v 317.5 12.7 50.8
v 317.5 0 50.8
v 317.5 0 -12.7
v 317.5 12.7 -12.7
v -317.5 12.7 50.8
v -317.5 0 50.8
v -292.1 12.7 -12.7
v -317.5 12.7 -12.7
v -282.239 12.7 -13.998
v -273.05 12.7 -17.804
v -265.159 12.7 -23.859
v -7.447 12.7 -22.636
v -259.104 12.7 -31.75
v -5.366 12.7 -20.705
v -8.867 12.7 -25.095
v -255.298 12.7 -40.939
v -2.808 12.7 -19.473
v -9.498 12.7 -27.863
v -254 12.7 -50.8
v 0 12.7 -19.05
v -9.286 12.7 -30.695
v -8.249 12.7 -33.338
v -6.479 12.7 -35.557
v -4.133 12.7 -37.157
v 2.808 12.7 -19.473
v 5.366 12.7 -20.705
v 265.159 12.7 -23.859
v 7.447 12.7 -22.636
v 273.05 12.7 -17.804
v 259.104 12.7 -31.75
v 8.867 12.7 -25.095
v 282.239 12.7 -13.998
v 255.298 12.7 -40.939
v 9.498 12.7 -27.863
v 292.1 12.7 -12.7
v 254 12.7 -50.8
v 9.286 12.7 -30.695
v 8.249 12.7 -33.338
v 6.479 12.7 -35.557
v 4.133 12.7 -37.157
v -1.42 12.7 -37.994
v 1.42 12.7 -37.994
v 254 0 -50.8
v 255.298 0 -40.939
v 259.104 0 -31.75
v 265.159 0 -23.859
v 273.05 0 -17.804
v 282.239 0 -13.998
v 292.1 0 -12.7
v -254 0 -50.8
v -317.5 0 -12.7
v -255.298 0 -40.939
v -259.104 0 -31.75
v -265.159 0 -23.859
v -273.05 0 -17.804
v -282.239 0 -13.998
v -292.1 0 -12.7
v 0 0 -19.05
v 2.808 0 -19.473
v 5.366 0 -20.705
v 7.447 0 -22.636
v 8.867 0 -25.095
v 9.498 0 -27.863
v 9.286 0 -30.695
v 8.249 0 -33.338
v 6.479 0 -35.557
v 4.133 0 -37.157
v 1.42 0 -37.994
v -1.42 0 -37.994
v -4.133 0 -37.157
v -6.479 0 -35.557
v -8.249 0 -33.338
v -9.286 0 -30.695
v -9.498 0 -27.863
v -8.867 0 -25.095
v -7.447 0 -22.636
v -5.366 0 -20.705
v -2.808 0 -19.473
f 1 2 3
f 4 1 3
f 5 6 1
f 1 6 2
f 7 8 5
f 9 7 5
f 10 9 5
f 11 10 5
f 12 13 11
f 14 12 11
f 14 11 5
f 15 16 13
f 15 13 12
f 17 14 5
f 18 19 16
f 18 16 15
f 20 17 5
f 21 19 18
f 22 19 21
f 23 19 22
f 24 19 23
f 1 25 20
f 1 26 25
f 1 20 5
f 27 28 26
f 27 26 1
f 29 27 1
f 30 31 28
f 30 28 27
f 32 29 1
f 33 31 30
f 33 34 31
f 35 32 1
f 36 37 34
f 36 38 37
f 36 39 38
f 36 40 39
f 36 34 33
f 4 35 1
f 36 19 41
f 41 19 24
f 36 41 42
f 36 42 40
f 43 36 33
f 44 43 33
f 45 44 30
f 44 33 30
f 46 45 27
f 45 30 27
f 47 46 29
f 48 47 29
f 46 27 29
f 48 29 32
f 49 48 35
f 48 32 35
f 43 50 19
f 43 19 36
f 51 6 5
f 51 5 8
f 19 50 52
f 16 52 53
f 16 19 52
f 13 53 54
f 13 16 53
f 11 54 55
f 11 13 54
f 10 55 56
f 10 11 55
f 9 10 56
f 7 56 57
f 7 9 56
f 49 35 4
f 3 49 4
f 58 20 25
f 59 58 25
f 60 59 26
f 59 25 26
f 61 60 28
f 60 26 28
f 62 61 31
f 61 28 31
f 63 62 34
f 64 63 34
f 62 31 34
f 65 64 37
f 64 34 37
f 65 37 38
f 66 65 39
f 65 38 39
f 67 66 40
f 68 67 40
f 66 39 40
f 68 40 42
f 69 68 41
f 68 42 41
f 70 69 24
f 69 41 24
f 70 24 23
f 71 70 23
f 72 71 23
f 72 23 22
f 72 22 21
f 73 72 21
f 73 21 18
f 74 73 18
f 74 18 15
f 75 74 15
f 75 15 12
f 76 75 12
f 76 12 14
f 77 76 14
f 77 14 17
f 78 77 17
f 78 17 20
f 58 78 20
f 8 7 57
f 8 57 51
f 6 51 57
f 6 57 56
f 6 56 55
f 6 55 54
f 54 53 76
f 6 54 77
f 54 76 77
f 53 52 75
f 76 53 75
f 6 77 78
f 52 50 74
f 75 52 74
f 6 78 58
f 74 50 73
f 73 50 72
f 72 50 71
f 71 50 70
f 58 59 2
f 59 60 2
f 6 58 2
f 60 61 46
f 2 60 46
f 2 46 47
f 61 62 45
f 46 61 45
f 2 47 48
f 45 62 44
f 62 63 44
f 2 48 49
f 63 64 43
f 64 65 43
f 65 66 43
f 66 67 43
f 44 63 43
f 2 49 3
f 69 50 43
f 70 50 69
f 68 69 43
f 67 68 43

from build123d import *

# Parameters (mm, degrees)
SKETCH1_W           = 635
SKETCH1_H           = 101.6
BOSS_EXTRUDE1_DEPTH = 12.7
CUT_EXTRUDE1_DEPTH  = 322.789030267
SKETCH3_R           = 9.525
CUT_EXTRUDE2_DEPTH  = 322.789030267


with BuildPart() as part:
    # Sketch1 → Boss-Extrude1 (new body)
    with BuildSketch(Plane(origin=(0, 0, 0), x_dir=(1, 0, 0), z_dir=(0, 1, 0))):
        Rectangle(SKETCH1_W, SKETCH1_H)
    extrude(amount=BOSS_EXTRUDE1_DEPTH)

    # Sketch2 → Cut-Extrude1 (cut, through all)
    with BuildSketch(Plane(origin=(0, 12.7, 0), x_dir=(1, 0, 0), z_dir=(0, 1, 0))):
        with BuildLine():
            Line((-292.1, 12.7), (-317.5, 12.7))
            Line((-317.5, 12.7), (-317.5, 50.8))
            Line((-317.5, 50.8), (-254, 50.8))
            ThreePointArc((-254, 50.8), (-265.159231637, 23.859231637), (-292.1, 12.7))
        make_face()
    cut_extrude1 = extrude(amount=-CUT_EXTRUDE1_DEPTH, mode=Mode.SUBTRACT)

    # Mirror1: Cut-Extrude1 across plane
    add(cut_extrude1.mirror(Plane(origin=(0, 0, 0), x_dir=(0, 0, 1), z_dir=(1, 0, 0))), mode=Mode.SUBTRACT)

    # Sketch3 → Cut-Extrude2 (cut, through all)
    with BuildSketch(Plane(origin=(0, 12.7, 0), x_dir=(1, 0, 0), z_dir=(0, 1, 0))):
        with Locations(Location((0, 28.575, 0), (0, 0, 270))):
            Circle(SKETCH3_R)
    extrude(amount=-CUT_EXTRUDE2_DEPTH, mode=Mode.SUBTRACT)


solid = part.part
